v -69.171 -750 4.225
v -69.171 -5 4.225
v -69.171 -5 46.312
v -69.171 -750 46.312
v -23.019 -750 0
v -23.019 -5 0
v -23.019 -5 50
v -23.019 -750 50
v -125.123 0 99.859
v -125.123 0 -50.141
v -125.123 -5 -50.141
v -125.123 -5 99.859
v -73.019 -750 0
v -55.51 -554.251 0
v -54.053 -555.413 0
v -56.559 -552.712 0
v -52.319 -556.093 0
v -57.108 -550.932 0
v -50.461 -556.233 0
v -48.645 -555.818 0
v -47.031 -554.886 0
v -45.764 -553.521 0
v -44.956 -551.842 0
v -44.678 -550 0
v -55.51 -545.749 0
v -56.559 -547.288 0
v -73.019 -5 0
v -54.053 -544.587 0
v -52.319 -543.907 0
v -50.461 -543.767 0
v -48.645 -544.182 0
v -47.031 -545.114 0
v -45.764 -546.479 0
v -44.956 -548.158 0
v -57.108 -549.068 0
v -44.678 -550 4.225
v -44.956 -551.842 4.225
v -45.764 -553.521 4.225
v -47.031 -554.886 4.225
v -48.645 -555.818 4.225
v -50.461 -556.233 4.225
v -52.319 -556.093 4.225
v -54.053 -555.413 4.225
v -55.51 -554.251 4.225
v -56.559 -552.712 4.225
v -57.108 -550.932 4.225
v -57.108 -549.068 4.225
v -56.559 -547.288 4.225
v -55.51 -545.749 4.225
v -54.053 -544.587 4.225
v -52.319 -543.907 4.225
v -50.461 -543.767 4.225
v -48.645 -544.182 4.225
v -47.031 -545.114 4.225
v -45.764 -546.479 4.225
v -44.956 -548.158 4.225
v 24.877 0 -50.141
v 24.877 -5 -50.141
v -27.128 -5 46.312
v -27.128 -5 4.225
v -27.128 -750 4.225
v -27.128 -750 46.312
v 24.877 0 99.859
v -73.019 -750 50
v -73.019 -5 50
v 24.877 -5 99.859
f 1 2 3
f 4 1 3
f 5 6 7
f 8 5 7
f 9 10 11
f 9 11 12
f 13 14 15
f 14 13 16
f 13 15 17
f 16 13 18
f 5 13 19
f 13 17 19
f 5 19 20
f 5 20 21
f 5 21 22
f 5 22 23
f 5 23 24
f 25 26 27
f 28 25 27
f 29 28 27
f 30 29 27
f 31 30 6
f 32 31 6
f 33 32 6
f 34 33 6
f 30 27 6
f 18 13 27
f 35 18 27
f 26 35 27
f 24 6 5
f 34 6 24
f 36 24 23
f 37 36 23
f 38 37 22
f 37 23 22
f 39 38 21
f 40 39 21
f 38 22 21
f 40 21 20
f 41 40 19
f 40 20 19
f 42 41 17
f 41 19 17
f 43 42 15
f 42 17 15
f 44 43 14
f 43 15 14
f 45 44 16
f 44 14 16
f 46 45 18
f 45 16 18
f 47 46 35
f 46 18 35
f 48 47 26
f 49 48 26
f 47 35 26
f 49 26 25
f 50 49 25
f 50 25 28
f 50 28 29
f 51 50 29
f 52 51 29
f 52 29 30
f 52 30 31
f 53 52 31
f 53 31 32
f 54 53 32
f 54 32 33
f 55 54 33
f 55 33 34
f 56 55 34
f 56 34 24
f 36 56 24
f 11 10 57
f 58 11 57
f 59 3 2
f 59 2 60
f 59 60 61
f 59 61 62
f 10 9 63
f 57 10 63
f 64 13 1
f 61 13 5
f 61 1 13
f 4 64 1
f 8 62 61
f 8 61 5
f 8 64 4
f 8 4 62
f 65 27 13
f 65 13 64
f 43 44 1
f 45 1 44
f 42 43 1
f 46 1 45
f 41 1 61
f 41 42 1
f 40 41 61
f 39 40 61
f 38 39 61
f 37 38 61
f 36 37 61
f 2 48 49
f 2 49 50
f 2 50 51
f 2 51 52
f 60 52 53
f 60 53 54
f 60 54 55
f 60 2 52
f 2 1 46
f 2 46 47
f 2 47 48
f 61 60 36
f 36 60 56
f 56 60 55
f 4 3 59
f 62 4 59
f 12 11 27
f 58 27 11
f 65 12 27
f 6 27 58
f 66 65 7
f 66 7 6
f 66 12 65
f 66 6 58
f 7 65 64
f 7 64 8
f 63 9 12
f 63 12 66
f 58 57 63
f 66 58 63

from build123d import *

# Parameters (mm, degrees)
F0_W     = 50
F0_H     = 50
F0_W_2   = 42.043511
F0_H_2   = 42.086583
F1_DEPTH = 750
F2_W     = 150
F2_H     = 150
F3_DEPTH = 5
F4_R     = 6.25
F5_DEPTH = 25


with BuildPart() as f1:
    # F0 (on Front) → F1 (new body)
    with BuildSketch(Plane.XZ):
        with Locations((-48.019424, 25)):
            Rectangle(F0_W, F0_H)
        with Locations((-48.149473, 25.268396)):
            Rectangle(F0_W_2, F0_H_2, mode=Mode.SUBTRACT)
    extrude(amount=F1_DEPTH)

    # F2 (on Front) → F3 (join)
    with BuildSketch(Plane.XZ):
        with Locations((-50.123258, 24.859246)):
            Rectangle(F2_W, F2_H)
    extrude(amount=F3_DEPTH)

    # F4 (on face) → F5 (cut)
    with BuildSketch(Plane(origin=(0, 0, 0), x_dir=(1, 0, 0), z_dir=(0, 0, -1))):
        with Locations((-50.928246, 550)):
            Circle(F4_R)
    extrude(amount=-F5_DEPTH, mode=Mode.SUBTRACT)


solid = f1.part
